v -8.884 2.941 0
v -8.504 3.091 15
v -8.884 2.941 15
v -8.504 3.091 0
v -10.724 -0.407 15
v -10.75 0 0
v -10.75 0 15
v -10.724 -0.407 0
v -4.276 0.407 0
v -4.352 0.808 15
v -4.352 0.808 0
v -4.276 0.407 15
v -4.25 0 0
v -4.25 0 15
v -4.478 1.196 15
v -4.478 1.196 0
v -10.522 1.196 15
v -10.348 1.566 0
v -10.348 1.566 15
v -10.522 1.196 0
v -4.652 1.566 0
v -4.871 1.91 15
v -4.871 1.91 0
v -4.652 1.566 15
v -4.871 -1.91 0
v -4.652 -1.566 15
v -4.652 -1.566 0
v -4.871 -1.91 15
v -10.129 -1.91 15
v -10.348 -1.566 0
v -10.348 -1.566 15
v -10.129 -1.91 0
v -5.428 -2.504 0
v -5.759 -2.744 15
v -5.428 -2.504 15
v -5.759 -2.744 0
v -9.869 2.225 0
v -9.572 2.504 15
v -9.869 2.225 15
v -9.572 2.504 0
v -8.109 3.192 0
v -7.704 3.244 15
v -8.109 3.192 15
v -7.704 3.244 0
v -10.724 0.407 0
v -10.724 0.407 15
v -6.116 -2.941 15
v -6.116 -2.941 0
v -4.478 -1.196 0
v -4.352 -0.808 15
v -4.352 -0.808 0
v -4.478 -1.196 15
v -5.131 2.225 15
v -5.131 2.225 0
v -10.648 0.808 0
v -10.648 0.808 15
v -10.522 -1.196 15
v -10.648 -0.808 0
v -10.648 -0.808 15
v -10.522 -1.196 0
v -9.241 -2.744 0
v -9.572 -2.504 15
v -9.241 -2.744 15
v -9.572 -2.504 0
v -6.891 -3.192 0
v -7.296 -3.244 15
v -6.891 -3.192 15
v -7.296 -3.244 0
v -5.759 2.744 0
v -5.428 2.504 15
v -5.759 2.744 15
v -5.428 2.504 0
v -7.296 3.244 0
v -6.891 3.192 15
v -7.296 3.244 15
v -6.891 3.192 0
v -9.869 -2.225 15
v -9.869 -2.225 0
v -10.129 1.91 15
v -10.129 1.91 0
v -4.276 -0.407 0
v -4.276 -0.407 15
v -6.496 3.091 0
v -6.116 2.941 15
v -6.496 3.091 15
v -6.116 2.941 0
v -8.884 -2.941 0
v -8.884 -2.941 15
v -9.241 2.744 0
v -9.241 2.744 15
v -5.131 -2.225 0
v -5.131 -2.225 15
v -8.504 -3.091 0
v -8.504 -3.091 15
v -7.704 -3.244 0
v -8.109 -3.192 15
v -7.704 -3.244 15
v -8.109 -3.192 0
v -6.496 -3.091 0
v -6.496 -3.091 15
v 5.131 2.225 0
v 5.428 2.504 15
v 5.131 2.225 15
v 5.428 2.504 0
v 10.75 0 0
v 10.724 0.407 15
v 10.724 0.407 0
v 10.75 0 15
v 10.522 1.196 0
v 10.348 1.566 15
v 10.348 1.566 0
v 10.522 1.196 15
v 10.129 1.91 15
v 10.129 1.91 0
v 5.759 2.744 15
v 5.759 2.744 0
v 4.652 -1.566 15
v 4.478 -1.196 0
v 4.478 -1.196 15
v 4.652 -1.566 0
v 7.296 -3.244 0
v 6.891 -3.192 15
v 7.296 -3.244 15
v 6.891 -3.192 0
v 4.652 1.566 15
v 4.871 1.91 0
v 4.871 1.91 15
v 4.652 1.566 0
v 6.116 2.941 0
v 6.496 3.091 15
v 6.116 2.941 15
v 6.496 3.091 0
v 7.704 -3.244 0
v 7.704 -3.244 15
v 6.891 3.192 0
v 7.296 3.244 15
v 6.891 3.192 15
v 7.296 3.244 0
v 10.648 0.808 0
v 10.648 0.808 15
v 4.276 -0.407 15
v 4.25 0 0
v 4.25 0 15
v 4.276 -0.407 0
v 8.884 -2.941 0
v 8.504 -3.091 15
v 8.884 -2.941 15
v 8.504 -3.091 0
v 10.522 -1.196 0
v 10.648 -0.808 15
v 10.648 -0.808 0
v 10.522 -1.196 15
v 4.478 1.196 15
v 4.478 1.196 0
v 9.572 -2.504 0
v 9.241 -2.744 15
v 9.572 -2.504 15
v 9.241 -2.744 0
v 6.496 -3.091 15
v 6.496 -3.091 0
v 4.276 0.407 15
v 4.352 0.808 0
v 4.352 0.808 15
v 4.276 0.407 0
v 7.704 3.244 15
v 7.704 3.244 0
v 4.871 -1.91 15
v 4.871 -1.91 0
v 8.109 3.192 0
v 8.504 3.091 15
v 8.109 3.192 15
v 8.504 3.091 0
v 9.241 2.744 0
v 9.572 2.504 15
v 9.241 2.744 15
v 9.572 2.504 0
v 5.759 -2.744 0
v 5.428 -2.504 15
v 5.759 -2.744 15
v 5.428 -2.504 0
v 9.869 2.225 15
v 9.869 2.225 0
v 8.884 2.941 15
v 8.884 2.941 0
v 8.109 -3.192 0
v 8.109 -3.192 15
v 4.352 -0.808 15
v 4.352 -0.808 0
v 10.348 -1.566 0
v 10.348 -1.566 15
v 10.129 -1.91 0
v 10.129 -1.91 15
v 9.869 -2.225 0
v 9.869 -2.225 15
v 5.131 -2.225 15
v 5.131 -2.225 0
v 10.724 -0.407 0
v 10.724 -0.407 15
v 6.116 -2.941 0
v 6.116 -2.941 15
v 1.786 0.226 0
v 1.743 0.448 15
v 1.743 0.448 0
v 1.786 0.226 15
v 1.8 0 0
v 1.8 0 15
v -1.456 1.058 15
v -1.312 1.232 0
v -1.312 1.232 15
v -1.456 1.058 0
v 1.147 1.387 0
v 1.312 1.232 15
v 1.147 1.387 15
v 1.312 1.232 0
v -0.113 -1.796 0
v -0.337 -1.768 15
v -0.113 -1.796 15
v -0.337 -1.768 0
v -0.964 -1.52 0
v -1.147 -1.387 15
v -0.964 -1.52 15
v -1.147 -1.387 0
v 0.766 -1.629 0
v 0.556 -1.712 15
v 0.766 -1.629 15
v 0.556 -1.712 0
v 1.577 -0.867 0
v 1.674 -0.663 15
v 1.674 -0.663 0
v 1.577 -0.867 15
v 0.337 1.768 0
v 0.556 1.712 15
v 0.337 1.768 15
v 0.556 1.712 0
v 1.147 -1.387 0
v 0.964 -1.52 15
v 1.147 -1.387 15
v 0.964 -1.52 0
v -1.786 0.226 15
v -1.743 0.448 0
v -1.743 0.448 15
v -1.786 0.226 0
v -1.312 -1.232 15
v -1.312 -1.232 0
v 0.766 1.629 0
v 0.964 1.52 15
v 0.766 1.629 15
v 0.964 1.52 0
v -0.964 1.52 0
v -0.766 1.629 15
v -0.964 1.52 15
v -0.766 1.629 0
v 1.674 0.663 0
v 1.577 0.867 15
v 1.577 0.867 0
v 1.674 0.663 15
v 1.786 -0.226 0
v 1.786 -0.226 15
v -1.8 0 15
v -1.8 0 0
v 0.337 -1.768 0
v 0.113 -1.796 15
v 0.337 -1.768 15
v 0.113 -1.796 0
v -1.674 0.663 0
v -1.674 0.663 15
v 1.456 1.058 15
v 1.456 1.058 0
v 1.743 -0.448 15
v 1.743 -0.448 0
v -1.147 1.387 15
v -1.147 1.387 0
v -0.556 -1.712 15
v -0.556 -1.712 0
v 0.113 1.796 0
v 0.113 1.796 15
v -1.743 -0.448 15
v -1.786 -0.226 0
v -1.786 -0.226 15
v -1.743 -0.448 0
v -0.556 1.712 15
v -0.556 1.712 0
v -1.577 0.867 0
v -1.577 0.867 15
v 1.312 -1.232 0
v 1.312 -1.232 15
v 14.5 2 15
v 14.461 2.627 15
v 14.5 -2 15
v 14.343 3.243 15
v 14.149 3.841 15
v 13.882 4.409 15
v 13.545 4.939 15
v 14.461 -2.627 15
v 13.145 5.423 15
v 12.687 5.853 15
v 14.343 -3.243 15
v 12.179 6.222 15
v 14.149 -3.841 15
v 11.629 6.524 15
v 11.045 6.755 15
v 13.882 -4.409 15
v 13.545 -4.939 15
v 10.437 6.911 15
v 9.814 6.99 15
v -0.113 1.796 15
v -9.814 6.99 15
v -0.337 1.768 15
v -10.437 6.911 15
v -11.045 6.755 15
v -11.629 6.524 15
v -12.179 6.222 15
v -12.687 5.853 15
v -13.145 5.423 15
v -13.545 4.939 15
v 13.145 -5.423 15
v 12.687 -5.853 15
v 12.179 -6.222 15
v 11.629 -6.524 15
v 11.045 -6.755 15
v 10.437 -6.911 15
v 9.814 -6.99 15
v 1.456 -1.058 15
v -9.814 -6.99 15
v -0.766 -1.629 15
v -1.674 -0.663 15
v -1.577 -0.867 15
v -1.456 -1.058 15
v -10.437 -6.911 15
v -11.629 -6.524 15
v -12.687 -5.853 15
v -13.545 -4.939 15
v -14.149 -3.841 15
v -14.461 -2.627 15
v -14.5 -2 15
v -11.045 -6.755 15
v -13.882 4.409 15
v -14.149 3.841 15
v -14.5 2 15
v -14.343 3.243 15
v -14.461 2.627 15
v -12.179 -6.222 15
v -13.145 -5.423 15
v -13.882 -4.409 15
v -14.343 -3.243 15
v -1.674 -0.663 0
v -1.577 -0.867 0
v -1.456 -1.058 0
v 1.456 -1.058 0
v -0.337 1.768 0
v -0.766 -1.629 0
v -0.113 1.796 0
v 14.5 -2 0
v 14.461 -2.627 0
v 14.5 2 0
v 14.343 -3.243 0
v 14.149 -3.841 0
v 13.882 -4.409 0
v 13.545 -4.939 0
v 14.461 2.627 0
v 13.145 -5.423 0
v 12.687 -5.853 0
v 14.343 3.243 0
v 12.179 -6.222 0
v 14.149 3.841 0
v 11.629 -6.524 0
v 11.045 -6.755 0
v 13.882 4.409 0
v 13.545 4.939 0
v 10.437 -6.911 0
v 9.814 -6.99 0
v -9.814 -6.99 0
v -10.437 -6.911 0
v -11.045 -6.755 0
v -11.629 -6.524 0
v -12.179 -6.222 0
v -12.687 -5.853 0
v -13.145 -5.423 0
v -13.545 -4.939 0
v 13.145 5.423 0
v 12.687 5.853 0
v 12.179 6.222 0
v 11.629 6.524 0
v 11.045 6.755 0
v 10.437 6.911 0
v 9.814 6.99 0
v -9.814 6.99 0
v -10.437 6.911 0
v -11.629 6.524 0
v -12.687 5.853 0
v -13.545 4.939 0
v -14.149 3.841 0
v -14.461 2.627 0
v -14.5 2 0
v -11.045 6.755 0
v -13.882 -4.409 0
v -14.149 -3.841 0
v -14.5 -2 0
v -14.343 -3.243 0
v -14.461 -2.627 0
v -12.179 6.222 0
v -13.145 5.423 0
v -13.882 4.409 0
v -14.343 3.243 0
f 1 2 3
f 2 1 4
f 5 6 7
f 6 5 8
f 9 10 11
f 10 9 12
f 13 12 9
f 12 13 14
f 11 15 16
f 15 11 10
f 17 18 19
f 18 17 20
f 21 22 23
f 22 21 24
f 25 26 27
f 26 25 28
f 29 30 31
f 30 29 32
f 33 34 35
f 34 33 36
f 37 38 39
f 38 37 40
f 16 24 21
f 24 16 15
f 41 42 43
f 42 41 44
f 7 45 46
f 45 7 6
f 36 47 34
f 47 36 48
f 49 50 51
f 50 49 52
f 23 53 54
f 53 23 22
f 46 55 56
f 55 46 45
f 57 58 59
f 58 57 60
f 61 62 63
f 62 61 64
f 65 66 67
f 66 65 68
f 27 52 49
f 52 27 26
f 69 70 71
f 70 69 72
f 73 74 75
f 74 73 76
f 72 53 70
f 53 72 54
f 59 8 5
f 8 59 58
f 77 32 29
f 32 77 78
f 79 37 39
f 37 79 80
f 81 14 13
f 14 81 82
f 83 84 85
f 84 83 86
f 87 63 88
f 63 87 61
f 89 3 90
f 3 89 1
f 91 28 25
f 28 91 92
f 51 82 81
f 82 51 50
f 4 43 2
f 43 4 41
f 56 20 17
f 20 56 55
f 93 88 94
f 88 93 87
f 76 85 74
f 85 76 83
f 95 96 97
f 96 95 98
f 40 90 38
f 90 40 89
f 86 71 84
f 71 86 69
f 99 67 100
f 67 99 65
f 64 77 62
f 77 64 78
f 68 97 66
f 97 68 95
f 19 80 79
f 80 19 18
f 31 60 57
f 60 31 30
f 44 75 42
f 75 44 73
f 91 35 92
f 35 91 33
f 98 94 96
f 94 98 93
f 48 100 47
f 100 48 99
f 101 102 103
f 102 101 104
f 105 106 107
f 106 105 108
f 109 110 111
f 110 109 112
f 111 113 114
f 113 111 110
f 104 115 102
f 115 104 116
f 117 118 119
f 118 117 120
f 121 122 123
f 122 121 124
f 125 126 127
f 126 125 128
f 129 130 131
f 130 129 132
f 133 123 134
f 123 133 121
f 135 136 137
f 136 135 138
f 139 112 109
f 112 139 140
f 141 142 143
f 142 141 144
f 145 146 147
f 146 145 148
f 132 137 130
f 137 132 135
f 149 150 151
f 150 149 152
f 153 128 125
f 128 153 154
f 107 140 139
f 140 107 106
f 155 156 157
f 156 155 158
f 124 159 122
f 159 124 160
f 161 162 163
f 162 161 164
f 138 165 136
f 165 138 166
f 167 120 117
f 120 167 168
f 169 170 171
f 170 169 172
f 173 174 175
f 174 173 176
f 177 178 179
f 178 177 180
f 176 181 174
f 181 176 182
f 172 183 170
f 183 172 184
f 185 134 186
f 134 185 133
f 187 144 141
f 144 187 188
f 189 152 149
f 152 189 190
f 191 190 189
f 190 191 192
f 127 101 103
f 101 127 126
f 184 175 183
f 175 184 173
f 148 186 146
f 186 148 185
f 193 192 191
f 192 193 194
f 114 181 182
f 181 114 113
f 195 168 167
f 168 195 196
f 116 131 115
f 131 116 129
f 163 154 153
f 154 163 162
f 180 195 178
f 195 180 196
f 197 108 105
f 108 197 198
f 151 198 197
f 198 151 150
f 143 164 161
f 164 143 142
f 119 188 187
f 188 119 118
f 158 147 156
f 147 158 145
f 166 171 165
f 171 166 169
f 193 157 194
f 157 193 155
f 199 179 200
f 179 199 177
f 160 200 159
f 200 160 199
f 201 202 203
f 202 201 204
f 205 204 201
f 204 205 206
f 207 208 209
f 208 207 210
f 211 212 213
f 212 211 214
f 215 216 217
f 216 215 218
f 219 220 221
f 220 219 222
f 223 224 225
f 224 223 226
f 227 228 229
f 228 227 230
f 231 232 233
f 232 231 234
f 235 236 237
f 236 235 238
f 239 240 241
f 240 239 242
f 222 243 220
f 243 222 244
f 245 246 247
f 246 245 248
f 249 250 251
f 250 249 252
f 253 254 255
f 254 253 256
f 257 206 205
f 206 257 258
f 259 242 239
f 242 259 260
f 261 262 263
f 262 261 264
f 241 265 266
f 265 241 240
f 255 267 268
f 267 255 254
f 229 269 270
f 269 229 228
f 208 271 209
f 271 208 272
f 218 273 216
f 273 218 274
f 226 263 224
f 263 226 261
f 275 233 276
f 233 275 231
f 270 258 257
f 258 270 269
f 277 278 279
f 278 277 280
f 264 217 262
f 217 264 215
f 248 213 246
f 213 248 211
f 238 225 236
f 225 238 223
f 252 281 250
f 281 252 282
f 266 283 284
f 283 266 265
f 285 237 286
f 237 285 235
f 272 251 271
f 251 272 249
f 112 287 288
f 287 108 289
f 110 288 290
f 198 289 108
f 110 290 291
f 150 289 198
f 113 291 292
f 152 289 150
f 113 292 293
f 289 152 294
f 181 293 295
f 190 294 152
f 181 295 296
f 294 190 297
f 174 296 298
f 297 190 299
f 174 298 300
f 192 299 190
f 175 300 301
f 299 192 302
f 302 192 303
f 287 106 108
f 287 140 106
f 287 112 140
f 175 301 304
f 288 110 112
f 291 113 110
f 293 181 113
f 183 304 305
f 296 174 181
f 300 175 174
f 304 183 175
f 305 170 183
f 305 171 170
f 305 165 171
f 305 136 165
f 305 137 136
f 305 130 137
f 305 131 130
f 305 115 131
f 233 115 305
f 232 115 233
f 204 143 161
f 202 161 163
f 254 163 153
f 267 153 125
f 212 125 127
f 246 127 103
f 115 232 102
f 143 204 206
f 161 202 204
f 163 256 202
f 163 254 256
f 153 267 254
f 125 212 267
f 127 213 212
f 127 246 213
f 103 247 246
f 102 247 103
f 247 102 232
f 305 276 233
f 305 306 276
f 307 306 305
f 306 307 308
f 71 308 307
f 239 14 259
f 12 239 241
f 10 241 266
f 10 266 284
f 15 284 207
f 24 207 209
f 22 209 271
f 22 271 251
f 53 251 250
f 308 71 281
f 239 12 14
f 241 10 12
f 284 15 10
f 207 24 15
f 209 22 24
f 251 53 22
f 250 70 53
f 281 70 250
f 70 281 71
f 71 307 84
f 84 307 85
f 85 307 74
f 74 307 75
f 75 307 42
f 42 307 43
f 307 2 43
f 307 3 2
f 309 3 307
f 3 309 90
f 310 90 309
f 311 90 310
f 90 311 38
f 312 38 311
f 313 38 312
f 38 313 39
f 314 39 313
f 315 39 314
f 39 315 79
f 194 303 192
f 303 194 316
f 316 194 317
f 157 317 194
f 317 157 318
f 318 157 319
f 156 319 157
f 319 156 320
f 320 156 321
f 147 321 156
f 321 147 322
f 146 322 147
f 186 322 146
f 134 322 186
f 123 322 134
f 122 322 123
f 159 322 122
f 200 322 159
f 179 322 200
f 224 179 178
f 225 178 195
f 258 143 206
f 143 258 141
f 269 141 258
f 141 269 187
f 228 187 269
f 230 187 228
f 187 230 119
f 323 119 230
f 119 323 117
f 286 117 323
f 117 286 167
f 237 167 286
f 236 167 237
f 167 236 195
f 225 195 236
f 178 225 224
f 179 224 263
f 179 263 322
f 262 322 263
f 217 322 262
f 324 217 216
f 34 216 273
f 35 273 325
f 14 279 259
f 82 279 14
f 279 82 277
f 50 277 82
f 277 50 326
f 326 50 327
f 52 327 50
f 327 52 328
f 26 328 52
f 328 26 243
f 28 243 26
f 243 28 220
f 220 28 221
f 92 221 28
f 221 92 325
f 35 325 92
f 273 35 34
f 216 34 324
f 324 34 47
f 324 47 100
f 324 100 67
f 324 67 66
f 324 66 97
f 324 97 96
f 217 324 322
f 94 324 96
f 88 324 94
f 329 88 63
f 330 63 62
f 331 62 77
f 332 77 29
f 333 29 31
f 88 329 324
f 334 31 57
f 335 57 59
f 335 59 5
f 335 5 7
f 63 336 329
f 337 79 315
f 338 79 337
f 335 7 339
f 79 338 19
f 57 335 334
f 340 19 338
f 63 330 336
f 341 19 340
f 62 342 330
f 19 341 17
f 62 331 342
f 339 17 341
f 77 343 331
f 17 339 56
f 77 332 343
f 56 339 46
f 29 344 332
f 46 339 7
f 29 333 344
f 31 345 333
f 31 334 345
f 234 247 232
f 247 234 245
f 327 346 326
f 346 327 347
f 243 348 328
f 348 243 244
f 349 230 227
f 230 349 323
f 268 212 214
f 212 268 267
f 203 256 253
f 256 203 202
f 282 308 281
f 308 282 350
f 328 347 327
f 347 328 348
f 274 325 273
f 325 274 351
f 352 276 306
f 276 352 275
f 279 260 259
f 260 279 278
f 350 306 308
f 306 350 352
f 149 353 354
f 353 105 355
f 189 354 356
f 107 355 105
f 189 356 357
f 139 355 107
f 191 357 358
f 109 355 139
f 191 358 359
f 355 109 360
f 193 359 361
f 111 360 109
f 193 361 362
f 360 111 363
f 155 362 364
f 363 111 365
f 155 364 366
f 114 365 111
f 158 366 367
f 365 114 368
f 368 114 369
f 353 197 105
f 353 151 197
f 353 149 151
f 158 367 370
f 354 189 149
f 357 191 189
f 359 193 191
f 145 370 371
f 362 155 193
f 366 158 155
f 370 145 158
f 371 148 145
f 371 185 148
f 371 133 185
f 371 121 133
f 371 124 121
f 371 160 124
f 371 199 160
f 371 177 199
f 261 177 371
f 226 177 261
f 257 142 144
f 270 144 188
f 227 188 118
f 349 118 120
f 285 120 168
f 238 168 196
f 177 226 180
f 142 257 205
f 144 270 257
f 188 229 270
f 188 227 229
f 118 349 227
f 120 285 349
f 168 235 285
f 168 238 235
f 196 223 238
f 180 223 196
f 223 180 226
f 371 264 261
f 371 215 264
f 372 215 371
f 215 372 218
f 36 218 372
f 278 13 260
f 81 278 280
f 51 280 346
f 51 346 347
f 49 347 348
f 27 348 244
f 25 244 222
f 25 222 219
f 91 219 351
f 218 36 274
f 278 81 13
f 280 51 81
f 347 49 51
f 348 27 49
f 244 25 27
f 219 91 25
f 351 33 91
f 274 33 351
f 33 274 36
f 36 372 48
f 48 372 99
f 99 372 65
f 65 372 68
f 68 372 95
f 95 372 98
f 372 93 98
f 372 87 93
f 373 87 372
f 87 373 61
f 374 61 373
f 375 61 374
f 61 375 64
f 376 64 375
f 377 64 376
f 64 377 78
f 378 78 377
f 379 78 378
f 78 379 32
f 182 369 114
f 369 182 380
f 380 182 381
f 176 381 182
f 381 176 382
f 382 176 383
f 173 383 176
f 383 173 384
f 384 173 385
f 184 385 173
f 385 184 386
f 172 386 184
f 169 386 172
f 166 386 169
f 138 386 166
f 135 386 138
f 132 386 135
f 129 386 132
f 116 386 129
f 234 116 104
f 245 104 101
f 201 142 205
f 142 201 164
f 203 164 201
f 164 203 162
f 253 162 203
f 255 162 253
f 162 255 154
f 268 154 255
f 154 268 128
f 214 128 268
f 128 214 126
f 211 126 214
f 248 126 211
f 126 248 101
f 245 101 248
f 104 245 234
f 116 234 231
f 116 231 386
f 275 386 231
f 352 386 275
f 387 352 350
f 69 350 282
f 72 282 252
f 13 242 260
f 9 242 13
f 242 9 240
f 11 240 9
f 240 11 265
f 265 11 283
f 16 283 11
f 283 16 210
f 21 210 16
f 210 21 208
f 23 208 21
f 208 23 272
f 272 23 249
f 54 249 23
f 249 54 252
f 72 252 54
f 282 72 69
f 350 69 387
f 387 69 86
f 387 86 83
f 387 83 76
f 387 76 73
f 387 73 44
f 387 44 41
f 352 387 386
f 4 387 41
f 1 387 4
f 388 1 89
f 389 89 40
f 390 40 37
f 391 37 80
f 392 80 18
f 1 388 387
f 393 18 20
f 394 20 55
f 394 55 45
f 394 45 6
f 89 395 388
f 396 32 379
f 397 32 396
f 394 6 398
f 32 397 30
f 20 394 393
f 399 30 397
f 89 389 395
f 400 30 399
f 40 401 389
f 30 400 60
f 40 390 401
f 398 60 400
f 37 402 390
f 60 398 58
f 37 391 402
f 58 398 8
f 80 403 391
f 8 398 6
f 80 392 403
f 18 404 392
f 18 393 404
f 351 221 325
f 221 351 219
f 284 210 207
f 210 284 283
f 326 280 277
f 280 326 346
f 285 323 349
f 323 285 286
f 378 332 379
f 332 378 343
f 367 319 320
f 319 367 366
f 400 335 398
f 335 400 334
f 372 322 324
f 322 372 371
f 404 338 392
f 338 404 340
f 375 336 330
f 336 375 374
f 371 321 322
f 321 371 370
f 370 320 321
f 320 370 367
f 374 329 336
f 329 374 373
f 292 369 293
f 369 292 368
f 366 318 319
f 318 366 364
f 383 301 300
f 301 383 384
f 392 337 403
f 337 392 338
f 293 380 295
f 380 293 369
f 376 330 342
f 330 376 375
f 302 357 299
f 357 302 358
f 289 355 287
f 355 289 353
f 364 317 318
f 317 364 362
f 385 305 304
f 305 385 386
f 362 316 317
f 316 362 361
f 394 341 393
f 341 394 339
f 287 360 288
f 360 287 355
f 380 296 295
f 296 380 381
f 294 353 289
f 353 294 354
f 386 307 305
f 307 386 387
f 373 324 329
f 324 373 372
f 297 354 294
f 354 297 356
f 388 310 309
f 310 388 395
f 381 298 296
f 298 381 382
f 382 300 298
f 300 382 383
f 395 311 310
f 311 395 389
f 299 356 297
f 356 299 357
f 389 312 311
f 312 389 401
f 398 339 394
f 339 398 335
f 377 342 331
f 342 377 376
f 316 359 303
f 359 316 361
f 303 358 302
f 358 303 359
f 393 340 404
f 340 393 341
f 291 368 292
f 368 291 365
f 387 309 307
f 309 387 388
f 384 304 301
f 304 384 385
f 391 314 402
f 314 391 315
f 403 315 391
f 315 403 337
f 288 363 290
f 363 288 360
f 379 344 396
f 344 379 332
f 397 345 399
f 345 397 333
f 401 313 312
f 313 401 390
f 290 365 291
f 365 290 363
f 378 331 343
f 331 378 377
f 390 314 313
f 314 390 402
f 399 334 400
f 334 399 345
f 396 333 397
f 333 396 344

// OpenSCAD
$fn = 50;


difference() {
	union() {
		hull() {
			translate(v = [-9.5000000000, 2.0000000000, 0]) {
				cylinder(h = 15, r = 5);
			}
			translate(v = [9.5000000000, 2.0000000000, 0]) {
				cylinder(h = 15, r = 5);
			}
			translate(v = [-9.5000000000, -2.0000000000, 0]) {
				cylinder(h = 15, r = 5);
			}
			translate(v = [9.5000000000, -2.0000000000, 0]) {
				cylinder(h = 15, r = 5);
			}
		}
	}
	union() {
		translate(v = [-7.5000000000, 0.0000000000, -100.0000000000]) {
			cylinder(h = 200, r = 3.2500000000);
		}
		translate(v = [7.5000000000, 0.0000000000, -100.0000000000]) {
			cylinder(h = 200, r = 3.2500000000);
		}
		translate(v = [-7.5000000000, 0.0000000000, 0]) {
			cylinder(h = 15, r = 1.8000000000);
		}
		cylinder(h = 15, r = 1.8000000000);
		translate(v = [7.5000000000, 0.0000000000, 0]) {
			cylinder(h = 15, r = 1.8000000000);
		}
		translate(v = [-7.5000000000, 0.0000000000, 0]) {
			cylinder(h = 15, r = 1.8000000000);
		}
		cylinder(h = 15, r = 1.8000000000);
		translate(v = [7.5000000000, 0.0000000000, 0]) {
			cylinder(h = 15, r = 1.8000000000);
		}
		translate(v = [-7.5000000000, 0.0000000000, 0]) {
			cylinder(h = 15, r = 1.8000000000);
		}
		cylinder(h = 15, r = 1.8000000000);
		translate(v = [7.5000000000, 0.0000000000, 0]) {
			cylinder(h = 15, r = 1.8000000000);
		}
	}
}
